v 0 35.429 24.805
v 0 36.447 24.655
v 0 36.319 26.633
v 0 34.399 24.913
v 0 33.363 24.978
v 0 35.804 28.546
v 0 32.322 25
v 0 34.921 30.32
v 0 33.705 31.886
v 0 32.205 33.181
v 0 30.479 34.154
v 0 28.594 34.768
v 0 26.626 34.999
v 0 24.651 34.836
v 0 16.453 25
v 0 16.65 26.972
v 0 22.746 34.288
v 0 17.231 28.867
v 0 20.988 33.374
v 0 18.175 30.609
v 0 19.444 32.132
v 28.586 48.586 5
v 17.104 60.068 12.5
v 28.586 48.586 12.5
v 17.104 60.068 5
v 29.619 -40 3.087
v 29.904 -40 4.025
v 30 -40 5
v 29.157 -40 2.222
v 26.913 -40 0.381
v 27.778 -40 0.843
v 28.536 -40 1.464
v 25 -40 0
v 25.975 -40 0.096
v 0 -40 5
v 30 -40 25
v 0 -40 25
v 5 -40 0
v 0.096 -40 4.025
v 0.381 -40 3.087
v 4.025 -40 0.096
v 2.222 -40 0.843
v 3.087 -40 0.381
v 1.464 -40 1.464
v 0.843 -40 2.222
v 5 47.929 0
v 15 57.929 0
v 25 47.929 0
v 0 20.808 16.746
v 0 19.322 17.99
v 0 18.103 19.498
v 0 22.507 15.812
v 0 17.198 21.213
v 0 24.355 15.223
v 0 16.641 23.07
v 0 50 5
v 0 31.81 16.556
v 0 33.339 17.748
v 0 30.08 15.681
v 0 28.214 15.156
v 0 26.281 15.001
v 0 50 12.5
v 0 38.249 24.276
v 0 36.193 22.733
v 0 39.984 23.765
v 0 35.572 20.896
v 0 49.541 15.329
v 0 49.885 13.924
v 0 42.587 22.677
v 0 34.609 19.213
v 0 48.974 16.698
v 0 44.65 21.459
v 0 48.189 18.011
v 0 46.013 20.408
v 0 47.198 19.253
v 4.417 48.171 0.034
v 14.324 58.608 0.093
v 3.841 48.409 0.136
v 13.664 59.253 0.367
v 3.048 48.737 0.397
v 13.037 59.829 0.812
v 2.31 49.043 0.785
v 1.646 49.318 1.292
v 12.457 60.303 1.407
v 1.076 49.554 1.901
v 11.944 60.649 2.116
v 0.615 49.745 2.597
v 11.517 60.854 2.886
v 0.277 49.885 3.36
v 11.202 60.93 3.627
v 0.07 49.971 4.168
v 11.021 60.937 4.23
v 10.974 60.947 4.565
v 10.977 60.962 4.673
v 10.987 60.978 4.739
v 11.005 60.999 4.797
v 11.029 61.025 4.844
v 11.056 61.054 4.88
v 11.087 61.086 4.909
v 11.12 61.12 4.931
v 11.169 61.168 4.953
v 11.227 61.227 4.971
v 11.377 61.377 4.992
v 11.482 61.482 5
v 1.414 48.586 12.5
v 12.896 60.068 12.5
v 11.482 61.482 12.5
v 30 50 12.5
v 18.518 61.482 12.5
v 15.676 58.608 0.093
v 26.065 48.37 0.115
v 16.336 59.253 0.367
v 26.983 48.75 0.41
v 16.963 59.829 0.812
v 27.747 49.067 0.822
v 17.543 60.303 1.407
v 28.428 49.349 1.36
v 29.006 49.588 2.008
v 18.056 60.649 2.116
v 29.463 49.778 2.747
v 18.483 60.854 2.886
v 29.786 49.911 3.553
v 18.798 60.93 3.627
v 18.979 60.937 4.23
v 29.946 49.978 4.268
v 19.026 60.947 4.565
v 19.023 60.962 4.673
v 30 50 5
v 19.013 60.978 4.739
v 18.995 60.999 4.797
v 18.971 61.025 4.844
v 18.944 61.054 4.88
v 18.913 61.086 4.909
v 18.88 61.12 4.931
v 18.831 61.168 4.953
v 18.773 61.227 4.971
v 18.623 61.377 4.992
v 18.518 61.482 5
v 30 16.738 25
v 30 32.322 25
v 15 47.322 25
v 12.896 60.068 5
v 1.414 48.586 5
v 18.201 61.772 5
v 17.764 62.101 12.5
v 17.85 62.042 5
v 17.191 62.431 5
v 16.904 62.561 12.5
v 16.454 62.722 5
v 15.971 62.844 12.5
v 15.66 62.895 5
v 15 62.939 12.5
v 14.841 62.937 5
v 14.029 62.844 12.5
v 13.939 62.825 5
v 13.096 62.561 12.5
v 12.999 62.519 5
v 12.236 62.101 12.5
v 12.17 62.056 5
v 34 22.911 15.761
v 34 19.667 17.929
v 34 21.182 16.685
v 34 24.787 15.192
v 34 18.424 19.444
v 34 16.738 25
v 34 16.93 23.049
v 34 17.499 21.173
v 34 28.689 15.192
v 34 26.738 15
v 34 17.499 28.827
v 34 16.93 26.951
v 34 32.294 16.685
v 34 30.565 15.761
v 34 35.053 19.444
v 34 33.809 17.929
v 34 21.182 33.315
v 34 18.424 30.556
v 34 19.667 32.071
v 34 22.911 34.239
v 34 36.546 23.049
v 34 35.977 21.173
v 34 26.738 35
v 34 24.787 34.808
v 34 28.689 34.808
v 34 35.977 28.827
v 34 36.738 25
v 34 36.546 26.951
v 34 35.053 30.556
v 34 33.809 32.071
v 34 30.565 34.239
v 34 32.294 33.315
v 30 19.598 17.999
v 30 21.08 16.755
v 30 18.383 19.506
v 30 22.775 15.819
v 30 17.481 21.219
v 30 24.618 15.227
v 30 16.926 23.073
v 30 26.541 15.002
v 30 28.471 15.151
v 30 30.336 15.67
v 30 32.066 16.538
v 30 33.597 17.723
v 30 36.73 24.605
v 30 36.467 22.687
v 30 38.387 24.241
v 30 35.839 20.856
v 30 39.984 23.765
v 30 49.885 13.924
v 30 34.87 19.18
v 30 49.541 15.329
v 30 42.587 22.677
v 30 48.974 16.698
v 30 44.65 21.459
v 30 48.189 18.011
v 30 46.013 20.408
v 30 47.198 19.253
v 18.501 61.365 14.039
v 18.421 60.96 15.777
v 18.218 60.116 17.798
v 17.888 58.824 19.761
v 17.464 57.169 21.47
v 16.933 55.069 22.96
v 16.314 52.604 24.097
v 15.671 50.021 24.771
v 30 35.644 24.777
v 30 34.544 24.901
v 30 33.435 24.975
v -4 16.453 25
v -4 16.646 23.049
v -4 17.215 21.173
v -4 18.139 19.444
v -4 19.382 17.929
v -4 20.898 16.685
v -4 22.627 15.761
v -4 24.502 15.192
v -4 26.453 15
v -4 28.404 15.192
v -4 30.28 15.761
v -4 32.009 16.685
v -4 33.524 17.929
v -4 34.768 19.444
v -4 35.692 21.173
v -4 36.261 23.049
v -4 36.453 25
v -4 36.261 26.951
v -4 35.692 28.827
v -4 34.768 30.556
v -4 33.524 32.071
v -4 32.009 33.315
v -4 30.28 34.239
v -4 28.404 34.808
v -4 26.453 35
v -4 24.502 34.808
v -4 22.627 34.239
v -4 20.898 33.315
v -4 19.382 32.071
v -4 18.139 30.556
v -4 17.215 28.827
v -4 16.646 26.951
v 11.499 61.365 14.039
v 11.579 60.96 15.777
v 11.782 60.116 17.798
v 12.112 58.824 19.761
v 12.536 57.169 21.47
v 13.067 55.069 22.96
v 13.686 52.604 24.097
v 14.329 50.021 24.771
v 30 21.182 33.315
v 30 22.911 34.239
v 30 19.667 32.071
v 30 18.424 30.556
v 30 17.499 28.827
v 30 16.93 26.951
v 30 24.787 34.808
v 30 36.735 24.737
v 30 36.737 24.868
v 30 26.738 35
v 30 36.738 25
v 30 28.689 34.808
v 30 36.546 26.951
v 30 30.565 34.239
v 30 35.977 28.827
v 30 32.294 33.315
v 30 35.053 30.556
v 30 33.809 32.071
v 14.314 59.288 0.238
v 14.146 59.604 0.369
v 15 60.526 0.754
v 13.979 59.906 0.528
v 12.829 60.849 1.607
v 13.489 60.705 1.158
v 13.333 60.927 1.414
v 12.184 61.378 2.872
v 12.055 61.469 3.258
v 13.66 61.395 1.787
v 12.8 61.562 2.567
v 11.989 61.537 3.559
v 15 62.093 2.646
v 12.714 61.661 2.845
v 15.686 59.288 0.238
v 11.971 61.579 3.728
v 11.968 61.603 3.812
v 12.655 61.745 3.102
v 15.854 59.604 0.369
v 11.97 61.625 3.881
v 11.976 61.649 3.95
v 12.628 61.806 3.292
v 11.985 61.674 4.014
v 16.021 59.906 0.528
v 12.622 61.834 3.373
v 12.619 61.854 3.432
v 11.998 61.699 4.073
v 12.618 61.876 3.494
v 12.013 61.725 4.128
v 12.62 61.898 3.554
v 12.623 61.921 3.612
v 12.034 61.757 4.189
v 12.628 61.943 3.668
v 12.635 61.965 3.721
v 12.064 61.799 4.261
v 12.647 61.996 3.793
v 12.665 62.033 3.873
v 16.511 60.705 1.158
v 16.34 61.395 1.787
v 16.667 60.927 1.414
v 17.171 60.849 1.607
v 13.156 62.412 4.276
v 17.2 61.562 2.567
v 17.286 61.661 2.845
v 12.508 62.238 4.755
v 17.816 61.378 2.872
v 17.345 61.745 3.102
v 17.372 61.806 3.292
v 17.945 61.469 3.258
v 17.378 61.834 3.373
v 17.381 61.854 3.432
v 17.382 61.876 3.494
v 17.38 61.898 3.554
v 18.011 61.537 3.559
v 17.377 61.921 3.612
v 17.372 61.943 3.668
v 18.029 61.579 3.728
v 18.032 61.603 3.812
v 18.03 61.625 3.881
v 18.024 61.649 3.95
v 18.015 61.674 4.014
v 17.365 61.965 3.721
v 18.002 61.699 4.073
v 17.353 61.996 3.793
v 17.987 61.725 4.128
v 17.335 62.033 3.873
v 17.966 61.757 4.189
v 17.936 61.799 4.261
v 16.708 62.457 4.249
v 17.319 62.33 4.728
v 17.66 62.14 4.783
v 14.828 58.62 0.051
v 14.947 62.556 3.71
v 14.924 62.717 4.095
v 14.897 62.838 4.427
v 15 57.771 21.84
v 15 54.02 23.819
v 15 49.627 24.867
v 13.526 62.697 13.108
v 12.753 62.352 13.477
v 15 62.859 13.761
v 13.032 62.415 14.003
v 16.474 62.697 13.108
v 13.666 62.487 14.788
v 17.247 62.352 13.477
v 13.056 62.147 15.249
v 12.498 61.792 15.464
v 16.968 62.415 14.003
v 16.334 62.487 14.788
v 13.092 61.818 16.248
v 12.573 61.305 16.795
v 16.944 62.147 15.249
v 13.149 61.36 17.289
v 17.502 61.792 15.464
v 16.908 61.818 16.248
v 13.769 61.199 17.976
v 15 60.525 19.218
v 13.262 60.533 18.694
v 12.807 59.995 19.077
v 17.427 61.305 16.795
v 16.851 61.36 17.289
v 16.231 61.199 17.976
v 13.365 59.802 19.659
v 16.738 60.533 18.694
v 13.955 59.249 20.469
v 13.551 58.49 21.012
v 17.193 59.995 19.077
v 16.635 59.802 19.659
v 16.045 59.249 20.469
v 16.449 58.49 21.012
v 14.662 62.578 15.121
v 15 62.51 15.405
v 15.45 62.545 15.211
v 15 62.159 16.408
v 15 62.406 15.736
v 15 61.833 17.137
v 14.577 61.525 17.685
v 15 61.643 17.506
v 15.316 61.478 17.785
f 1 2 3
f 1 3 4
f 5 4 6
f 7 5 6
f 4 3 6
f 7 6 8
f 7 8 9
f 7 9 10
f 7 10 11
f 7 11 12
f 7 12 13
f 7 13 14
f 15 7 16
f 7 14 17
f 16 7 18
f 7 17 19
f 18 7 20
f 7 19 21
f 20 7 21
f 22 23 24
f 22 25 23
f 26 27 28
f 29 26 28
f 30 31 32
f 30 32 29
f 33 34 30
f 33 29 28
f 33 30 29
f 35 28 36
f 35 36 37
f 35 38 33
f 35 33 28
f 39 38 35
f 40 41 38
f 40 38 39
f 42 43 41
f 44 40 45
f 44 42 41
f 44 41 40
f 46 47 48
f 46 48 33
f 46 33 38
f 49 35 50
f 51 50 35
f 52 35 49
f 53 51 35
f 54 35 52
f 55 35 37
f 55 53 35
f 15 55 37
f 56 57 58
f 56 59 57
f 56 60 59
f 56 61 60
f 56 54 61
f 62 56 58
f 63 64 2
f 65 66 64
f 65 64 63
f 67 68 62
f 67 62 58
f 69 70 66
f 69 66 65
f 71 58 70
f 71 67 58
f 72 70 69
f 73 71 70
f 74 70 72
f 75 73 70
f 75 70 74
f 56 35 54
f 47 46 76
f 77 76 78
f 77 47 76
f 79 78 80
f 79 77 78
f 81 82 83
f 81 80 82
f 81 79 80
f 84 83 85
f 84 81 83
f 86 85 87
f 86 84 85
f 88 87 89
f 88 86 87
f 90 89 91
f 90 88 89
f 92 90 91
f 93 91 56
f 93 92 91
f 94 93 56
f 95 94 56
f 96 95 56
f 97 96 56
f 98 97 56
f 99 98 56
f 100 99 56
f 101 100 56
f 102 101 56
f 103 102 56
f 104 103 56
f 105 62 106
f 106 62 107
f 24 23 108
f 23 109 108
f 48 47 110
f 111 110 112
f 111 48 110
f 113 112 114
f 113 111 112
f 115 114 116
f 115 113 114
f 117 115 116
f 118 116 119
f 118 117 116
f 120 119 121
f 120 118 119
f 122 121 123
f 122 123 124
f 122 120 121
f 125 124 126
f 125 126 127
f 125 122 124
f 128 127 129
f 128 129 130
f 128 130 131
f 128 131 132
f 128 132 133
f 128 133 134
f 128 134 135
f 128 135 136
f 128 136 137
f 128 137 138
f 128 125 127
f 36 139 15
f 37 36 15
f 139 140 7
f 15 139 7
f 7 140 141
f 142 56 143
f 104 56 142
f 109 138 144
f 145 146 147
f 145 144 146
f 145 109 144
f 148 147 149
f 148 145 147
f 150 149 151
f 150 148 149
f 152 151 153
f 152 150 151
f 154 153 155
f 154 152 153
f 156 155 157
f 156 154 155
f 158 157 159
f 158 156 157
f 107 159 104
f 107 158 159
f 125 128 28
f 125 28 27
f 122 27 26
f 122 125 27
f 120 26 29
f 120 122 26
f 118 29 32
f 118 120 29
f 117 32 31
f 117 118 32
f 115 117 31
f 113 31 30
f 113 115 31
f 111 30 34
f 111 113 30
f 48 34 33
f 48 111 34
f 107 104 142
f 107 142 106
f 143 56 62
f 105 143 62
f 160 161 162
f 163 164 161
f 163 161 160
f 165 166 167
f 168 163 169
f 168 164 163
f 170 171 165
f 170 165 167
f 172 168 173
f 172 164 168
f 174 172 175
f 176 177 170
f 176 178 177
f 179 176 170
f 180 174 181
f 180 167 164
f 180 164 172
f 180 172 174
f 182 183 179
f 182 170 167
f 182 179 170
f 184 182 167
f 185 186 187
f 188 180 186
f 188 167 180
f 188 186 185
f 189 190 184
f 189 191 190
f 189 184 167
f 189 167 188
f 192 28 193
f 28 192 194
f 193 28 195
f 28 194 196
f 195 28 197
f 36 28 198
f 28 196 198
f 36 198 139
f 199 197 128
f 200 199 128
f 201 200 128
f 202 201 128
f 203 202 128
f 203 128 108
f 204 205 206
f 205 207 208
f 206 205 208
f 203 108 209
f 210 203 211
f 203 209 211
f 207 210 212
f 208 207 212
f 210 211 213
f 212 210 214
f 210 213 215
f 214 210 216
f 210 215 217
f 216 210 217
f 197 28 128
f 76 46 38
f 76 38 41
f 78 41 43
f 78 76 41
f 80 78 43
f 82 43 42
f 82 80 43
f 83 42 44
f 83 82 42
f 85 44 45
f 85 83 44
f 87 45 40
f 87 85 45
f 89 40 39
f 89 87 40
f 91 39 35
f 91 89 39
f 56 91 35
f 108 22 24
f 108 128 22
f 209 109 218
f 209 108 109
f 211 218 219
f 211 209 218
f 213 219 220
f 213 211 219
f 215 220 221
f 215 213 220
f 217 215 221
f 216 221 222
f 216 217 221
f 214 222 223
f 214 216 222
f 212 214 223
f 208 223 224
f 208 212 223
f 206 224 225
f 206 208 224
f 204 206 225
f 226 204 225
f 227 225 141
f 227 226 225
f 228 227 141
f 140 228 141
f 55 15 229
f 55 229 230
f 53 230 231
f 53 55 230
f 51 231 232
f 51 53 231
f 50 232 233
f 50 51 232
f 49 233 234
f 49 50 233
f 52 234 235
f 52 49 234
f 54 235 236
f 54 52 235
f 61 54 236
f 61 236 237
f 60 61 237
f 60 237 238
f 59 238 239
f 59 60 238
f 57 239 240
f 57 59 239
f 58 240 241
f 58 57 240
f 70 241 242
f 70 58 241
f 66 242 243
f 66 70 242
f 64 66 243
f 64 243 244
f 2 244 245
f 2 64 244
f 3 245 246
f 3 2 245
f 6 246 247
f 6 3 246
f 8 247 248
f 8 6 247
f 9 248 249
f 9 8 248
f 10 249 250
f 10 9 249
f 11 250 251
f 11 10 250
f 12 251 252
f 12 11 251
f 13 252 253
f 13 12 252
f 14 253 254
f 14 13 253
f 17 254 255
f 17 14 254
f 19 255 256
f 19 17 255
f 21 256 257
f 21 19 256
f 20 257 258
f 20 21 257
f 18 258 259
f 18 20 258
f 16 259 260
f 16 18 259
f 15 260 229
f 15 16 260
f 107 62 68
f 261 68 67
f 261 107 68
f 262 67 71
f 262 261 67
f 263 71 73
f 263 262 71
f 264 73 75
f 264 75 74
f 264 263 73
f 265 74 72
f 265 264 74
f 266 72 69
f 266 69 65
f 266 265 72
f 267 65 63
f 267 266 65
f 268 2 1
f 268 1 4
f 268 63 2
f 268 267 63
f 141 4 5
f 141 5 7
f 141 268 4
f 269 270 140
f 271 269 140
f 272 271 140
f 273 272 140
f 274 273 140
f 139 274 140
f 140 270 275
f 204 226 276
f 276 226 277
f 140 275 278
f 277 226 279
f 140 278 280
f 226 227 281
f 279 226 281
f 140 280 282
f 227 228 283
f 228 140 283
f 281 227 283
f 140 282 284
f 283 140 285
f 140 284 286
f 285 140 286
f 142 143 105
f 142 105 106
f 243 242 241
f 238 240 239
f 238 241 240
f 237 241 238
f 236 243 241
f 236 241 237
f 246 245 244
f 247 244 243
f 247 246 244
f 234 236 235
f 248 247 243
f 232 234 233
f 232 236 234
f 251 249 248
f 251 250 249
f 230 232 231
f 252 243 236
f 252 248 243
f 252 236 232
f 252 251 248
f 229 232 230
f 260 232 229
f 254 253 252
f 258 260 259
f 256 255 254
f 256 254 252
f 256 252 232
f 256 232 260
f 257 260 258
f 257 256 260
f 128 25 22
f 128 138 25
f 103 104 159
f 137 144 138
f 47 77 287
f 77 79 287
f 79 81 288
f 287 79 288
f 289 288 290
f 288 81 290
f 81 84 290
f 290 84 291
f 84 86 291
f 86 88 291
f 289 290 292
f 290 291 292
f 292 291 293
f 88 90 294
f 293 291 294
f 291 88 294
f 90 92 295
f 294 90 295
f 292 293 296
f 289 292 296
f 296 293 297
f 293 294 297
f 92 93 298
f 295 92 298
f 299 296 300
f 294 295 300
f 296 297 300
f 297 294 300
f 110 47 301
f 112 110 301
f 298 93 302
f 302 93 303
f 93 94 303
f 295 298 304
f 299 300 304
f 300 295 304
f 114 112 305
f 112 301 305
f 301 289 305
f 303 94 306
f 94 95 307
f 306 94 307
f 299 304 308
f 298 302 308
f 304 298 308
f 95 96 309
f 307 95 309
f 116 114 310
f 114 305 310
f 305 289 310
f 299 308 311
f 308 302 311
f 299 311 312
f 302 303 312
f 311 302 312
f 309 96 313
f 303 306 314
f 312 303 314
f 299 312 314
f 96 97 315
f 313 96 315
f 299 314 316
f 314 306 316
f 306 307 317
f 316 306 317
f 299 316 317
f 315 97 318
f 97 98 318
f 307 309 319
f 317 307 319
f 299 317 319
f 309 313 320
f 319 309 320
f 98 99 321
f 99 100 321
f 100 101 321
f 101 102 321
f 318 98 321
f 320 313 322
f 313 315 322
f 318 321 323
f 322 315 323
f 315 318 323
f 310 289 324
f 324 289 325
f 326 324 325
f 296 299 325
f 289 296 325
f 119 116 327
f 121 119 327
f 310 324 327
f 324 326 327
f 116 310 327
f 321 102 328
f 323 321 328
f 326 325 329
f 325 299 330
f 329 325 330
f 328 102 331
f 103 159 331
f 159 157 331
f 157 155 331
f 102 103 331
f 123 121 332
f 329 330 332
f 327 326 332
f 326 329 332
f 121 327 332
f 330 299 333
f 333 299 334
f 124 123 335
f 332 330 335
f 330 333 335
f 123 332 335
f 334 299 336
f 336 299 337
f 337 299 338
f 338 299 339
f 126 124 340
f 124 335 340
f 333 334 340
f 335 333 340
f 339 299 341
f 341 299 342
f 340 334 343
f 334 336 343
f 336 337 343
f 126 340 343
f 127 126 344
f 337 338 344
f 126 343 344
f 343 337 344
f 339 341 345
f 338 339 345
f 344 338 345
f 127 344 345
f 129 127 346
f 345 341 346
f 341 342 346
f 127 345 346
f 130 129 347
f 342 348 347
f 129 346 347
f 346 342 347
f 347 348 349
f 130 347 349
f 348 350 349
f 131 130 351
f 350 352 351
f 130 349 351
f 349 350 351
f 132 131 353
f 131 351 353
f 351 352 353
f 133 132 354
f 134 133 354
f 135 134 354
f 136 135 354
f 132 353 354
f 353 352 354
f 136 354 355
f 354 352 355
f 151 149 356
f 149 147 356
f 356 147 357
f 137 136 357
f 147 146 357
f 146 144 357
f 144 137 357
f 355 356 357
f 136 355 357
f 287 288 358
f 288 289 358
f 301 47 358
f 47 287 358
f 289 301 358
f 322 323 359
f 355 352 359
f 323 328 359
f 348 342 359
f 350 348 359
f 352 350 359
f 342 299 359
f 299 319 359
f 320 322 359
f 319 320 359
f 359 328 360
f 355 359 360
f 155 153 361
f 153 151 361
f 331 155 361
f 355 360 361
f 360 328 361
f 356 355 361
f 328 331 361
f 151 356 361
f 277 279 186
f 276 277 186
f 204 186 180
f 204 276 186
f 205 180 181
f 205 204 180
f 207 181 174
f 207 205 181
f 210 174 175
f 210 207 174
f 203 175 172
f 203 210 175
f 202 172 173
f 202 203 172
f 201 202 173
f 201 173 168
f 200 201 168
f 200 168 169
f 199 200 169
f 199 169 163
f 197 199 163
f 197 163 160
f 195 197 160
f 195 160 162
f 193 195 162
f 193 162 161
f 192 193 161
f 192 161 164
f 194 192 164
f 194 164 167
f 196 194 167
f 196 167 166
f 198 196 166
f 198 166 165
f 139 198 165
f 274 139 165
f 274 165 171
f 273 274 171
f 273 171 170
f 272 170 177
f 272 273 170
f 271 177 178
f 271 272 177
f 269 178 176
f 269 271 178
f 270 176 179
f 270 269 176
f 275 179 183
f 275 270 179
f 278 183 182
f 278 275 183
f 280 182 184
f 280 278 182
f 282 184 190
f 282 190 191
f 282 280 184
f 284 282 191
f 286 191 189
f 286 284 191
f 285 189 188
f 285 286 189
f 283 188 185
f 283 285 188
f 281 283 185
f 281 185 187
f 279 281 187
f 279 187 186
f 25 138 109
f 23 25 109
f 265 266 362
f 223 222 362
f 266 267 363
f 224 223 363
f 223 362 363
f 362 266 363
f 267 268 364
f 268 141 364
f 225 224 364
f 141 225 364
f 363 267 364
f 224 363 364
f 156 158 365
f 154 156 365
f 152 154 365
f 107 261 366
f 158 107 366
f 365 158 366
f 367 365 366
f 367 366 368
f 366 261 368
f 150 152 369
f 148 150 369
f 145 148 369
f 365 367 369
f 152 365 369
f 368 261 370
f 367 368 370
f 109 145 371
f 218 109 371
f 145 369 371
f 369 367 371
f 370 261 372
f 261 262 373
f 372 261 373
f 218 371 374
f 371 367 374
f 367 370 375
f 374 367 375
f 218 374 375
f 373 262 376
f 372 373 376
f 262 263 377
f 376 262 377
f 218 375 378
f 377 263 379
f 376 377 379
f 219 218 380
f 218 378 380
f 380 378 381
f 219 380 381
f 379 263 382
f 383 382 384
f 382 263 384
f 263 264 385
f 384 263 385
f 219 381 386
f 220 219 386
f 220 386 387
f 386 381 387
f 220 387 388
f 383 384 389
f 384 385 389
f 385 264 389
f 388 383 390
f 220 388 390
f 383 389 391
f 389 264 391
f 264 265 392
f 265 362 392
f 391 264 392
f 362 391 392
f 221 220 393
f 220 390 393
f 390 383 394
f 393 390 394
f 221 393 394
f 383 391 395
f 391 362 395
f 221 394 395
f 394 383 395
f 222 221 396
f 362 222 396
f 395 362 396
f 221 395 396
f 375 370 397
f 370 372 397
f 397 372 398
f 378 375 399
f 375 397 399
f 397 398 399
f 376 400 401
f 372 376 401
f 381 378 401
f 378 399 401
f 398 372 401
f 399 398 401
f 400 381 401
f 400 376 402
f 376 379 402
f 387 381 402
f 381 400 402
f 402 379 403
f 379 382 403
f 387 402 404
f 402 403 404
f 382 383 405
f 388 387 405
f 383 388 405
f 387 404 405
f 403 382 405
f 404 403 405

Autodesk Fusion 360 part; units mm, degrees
sketch "Sketch1" plane through (0, 0, 0) normal (0, 0, 1) x (1, 0, 0)
sketch "Sketch2" plane through (0, 0, 0) normal (0, 0, 1) x (1, 0, 0)
sketch "Sketch3" plane through (0, 0, 0) normal (0, 0, 1) x (1, 0, 0)
  line L0 (0, 0) -> (0, 50)
  line L1 (0, 50) -> (15, 65)
  line L2 (15, 65) -> (30, 50)
  line L3 (30, 50) -> (30, 0)
  line L4 (30, 0) -> (0, 0)
extrude "Extrude1" add sketch "Sketch3" along normal blind 25
fillet "Fillet1" radius 12.5 2 edges at (22.5, 57.5, 25) (7.5, 57.5, 25)
fillet "Fillet2" radius 5 4 edges at (0, 25, 0) (30, 25, 0) (22.5, 57.5, 0) (7.5, 57.5, 0)
fillet "Fillet3" radius 5 3 edges at (15, 62.9289, 1.4645) (15, 65, 8.75) (15, 59.8223, 21.3388)
extrude "Extrude2" add 1 faces at (11.6667, 0, 16.6667) along direction (0, -1, 0) blind 40
extrude "Extrude3" cut 1 faces at (22.3452, 57.6548, 10) along direction (-0.707107, -0.707107, 0) blind 2
extrude "Extrude4" cut 1 faces at (7.6548, 57.6548, 10) along direction (0.707107, -0.707107, 0) blind 2
sketch "Sketch4" plane through (0, 0, 0) normal (-1, 0, 0) x (0, -1, 0)
  line L0 (-50, 5) -> (40, 5)
  line L1 (40, 5) -> (40, 25)
  line L2 (40, 25) -> (-32.3223, 25)
  ellipse E0 centre (-32.3223, 12.5) end of major axis (-50, 12.5) minor radius 12.5 (-32.3223, 25) -> (-50, 12.5) ccw
  line L3 (-50, 12.5) -> (-50, 5)
  circle A0 centre (-26.4534, 25) radius 10
  dimension "d15" = 20
extrude "Extrude5" add sketch "Sketch4" along normal blind 3 contours L2 E0 A0 | L2 E0 A0
extrude "Extrude6" add 1 faces at (-3, 25.7282, 28.0287) along direction (-1, 0, 0) blind 1
sketch "Sketch5" plane through (30, 0, 0) normal (1, 0, 0) x (0, 1, 0)
  line L0 (-40, 5) -> (50, 5)
  line L1 (50, 5) -> (50, 12.5)
  ellipse E0 centre (32.3223, 12.5) end of major axis (50, 12.5) minor radius 12.5 (50, 12.5) -> (32.3223, 25) ccw
  line L2 (32.3223, 25) -> (-40, 25)
  line L3 (-40, 25) -> (-40, 5)
  circle A0 centre (26.7382, 25) radius 10
  dimension "d20" = 20
extrude "Extrude7" add sketch "Sketch5" along normal blind 4 contours E0 L2 A0 | E0 L2 A0
